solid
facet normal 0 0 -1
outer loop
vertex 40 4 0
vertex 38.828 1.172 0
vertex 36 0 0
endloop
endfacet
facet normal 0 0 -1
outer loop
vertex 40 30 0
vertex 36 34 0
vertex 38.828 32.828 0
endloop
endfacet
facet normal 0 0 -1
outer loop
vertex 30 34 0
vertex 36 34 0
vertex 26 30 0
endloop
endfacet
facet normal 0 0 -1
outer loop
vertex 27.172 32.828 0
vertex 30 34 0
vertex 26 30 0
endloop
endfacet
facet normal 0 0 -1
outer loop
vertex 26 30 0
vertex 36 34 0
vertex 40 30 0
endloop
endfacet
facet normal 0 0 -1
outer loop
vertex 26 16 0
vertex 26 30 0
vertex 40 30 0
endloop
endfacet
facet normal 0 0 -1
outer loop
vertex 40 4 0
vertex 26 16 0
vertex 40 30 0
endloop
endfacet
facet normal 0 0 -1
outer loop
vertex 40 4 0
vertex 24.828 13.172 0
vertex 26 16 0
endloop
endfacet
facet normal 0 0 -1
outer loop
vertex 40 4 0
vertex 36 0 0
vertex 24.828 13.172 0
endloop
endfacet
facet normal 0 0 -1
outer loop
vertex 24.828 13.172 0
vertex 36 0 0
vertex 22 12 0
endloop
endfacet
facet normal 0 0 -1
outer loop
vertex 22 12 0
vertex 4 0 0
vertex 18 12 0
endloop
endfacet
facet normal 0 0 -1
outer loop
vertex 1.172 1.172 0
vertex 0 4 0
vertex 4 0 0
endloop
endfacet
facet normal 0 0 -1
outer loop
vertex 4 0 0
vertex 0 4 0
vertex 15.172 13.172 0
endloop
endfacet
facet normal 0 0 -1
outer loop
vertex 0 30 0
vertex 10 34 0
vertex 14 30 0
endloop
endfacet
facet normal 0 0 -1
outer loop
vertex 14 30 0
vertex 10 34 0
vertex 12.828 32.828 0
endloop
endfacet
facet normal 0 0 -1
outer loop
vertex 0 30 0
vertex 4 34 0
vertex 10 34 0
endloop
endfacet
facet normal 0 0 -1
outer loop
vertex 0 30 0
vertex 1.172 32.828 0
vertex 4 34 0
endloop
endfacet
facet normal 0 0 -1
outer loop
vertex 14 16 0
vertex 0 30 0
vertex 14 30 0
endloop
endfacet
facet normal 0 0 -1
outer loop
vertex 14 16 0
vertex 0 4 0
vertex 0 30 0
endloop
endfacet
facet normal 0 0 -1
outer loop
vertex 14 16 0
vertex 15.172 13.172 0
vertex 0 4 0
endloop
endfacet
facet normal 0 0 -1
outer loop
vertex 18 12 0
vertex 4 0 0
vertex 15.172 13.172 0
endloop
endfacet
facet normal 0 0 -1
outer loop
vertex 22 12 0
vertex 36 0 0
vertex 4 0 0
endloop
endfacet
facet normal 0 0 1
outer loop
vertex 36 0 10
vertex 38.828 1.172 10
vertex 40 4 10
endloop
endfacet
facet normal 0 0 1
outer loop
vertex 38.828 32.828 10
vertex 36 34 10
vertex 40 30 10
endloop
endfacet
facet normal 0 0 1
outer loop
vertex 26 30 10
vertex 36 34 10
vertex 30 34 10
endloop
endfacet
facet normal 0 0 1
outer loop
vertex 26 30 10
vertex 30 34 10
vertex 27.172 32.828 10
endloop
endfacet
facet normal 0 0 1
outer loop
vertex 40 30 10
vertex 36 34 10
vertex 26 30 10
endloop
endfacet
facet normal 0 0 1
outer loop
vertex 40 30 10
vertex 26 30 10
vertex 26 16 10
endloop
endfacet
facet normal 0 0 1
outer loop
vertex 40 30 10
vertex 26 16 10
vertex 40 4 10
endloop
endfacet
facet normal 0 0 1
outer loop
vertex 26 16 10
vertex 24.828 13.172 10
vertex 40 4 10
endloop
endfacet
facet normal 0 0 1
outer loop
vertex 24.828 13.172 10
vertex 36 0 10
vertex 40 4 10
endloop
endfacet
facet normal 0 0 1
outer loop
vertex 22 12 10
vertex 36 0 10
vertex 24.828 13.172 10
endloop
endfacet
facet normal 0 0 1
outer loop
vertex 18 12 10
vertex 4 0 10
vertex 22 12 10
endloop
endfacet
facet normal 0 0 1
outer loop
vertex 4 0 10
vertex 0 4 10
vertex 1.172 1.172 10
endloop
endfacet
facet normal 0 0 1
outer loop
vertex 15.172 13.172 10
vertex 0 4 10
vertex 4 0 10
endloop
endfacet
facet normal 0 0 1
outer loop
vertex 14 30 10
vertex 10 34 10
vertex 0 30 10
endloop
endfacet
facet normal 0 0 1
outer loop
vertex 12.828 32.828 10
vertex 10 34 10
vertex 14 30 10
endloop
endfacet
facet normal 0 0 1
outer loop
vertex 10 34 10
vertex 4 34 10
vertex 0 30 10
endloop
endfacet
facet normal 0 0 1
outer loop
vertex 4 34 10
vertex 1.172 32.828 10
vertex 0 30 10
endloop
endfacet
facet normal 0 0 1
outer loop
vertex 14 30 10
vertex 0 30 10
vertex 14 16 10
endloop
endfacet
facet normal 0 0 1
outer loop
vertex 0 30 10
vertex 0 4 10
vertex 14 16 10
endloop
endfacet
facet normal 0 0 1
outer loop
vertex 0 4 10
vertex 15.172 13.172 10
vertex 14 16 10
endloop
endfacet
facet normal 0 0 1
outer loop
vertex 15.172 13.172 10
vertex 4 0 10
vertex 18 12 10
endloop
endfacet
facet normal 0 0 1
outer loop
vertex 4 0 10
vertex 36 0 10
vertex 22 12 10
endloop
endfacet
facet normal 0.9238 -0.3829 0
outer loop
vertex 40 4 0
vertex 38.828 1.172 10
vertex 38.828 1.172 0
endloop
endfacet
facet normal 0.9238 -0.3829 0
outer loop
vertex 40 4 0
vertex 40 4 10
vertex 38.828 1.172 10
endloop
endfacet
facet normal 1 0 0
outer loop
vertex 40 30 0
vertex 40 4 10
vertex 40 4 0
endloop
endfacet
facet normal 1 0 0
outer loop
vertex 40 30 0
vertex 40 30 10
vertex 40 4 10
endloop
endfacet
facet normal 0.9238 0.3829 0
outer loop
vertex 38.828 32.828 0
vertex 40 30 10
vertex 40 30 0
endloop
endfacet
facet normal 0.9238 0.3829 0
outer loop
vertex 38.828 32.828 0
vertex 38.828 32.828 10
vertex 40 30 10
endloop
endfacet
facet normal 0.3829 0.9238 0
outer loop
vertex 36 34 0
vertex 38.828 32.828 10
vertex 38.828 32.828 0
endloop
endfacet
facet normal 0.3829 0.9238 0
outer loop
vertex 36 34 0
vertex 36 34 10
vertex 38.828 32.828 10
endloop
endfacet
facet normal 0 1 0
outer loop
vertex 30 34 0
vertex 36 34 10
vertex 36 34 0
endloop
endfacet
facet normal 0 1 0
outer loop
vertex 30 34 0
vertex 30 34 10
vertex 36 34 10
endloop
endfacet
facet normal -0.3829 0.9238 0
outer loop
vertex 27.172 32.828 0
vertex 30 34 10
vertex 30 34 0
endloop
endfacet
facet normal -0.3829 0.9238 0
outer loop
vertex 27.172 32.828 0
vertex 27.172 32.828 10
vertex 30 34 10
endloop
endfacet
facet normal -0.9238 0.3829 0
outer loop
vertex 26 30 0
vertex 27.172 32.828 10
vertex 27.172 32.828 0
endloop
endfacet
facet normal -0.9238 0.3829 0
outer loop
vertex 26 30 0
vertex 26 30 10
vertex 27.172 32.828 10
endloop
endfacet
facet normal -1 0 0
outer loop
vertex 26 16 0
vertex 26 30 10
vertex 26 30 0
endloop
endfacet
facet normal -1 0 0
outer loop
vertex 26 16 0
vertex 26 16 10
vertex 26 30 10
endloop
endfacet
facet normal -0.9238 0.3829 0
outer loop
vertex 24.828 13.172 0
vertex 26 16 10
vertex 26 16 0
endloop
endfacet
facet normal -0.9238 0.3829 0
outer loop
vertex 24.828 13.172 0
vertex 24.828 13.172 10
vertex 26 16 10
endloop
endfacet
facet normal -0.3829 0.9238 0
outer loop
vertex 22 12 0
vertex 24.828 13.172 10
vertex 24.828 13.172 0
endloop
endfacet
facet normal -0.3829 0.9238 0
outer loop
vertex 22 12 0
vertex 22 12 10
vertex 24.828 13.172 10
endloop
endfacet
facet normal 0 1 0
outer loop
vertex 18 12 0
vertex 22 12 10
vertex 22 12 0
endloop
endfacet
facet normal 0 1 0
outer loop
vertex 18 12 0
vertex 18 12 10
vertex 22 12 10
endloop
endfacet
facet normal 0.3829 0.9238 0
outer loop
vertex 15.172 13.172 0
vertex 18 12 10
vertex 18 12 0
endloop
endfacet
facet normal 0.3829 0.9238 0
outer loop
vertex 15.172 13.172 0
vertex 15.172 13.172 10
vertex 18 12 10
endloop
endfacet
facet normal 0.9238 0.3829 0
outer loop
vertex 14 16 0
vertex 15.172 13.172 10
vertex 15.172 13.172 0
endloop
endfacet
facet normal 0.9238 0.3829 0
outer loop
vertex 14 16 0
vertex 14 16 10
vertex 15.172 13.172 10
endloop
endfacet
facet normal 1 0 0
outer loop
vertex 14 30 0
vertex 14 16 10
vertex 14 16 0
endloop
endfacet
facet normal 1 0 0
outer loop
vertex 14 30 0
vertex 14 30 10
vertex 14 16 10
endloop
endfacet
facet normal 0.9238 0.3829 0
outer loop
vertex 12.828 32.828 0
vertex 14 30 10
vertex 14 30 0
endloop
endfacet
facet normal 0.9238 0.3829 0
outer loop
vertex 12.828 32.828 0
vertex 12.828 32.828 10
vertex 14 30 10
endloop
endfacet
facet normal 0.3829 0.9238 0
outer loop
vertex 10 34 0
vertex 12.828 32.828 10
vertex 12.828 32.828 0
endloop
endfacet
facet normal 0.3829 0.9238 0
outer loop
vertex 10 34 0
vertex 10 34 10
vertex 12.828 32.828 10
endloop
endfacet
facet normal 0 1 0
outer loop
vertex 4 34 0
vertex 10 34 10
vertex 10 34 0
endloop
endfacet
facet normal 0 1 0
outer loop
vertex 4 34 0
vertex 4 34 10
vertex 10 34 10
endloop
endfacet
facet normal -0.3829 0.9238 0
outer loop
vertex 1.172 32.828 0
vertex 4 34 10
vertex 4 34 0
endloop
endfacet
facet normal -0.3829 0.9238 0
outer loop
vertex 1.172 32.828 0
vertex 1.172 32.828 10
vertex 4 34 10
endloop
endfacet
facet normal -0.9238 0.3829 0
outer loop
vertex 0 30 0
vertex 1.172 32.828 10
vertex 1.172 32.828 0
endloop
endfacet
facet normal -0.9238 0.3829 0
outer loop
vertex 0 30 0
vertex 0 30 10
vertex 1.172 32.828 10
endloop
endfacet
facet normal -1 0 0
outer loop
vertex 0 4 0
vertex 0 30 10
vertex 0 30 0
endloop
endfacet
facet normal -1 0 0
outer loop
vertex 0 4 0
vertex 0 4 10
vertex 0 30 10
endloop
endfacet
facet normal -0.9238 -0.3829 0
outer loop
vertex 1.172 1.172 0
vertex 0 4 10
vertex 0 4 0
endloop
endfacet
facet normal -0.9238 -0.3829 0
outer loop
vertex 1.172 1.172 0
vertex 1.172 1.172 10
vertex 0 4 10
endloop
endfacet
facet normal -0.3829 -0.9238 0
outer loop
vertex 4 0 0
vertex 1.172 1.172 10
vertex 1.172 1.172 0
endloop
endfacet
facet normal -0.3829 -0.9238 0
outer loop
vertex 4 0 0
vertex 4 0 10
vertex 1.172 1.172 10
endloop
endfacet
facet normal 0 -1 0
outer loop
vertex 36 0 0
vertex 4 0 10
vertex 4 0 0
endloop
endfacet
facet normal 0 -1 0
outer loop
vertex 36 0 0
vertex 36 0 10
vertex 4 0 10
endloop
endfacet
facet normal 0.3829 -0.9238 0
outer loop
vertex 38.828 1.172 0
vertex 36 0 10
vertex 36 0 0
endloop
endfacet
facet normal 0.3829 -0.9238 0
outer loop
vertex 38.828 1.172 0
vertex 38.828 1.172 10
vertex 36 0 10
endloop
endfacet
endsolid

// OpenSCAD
$fn = 32;

// ----------------------------------------------------------------------
// Eye lug: clevis, 10 mm thick
// ----------------------------------------------------------------------

// --- parameters (mm) ---
profile_height = 10;      // extrusion height
profile_points = 24;      // points of the closed outline

profile = [[0, 4], [1.172, 1.172], [4, 0], [36, 0], [38.828, 1.172], [40, 4], [40, 30], [38.828, 32.828], [36, 34], [30, 34], [27.172, 32.828], [26, 30], [26, 16], [24.828, 13.172], [22, 12], [18, 12], [15.172, 13.172], [14, 16], [14, 30], [12.828, 32.828], [10, 34], [4, 34], [1.172, 32.828], [0, 30]];  // single closed polygon, 24 points, counter clockwise

// --- the one profile operation ---
linear_extrude(height = profile_height) polygon(points = profile);
